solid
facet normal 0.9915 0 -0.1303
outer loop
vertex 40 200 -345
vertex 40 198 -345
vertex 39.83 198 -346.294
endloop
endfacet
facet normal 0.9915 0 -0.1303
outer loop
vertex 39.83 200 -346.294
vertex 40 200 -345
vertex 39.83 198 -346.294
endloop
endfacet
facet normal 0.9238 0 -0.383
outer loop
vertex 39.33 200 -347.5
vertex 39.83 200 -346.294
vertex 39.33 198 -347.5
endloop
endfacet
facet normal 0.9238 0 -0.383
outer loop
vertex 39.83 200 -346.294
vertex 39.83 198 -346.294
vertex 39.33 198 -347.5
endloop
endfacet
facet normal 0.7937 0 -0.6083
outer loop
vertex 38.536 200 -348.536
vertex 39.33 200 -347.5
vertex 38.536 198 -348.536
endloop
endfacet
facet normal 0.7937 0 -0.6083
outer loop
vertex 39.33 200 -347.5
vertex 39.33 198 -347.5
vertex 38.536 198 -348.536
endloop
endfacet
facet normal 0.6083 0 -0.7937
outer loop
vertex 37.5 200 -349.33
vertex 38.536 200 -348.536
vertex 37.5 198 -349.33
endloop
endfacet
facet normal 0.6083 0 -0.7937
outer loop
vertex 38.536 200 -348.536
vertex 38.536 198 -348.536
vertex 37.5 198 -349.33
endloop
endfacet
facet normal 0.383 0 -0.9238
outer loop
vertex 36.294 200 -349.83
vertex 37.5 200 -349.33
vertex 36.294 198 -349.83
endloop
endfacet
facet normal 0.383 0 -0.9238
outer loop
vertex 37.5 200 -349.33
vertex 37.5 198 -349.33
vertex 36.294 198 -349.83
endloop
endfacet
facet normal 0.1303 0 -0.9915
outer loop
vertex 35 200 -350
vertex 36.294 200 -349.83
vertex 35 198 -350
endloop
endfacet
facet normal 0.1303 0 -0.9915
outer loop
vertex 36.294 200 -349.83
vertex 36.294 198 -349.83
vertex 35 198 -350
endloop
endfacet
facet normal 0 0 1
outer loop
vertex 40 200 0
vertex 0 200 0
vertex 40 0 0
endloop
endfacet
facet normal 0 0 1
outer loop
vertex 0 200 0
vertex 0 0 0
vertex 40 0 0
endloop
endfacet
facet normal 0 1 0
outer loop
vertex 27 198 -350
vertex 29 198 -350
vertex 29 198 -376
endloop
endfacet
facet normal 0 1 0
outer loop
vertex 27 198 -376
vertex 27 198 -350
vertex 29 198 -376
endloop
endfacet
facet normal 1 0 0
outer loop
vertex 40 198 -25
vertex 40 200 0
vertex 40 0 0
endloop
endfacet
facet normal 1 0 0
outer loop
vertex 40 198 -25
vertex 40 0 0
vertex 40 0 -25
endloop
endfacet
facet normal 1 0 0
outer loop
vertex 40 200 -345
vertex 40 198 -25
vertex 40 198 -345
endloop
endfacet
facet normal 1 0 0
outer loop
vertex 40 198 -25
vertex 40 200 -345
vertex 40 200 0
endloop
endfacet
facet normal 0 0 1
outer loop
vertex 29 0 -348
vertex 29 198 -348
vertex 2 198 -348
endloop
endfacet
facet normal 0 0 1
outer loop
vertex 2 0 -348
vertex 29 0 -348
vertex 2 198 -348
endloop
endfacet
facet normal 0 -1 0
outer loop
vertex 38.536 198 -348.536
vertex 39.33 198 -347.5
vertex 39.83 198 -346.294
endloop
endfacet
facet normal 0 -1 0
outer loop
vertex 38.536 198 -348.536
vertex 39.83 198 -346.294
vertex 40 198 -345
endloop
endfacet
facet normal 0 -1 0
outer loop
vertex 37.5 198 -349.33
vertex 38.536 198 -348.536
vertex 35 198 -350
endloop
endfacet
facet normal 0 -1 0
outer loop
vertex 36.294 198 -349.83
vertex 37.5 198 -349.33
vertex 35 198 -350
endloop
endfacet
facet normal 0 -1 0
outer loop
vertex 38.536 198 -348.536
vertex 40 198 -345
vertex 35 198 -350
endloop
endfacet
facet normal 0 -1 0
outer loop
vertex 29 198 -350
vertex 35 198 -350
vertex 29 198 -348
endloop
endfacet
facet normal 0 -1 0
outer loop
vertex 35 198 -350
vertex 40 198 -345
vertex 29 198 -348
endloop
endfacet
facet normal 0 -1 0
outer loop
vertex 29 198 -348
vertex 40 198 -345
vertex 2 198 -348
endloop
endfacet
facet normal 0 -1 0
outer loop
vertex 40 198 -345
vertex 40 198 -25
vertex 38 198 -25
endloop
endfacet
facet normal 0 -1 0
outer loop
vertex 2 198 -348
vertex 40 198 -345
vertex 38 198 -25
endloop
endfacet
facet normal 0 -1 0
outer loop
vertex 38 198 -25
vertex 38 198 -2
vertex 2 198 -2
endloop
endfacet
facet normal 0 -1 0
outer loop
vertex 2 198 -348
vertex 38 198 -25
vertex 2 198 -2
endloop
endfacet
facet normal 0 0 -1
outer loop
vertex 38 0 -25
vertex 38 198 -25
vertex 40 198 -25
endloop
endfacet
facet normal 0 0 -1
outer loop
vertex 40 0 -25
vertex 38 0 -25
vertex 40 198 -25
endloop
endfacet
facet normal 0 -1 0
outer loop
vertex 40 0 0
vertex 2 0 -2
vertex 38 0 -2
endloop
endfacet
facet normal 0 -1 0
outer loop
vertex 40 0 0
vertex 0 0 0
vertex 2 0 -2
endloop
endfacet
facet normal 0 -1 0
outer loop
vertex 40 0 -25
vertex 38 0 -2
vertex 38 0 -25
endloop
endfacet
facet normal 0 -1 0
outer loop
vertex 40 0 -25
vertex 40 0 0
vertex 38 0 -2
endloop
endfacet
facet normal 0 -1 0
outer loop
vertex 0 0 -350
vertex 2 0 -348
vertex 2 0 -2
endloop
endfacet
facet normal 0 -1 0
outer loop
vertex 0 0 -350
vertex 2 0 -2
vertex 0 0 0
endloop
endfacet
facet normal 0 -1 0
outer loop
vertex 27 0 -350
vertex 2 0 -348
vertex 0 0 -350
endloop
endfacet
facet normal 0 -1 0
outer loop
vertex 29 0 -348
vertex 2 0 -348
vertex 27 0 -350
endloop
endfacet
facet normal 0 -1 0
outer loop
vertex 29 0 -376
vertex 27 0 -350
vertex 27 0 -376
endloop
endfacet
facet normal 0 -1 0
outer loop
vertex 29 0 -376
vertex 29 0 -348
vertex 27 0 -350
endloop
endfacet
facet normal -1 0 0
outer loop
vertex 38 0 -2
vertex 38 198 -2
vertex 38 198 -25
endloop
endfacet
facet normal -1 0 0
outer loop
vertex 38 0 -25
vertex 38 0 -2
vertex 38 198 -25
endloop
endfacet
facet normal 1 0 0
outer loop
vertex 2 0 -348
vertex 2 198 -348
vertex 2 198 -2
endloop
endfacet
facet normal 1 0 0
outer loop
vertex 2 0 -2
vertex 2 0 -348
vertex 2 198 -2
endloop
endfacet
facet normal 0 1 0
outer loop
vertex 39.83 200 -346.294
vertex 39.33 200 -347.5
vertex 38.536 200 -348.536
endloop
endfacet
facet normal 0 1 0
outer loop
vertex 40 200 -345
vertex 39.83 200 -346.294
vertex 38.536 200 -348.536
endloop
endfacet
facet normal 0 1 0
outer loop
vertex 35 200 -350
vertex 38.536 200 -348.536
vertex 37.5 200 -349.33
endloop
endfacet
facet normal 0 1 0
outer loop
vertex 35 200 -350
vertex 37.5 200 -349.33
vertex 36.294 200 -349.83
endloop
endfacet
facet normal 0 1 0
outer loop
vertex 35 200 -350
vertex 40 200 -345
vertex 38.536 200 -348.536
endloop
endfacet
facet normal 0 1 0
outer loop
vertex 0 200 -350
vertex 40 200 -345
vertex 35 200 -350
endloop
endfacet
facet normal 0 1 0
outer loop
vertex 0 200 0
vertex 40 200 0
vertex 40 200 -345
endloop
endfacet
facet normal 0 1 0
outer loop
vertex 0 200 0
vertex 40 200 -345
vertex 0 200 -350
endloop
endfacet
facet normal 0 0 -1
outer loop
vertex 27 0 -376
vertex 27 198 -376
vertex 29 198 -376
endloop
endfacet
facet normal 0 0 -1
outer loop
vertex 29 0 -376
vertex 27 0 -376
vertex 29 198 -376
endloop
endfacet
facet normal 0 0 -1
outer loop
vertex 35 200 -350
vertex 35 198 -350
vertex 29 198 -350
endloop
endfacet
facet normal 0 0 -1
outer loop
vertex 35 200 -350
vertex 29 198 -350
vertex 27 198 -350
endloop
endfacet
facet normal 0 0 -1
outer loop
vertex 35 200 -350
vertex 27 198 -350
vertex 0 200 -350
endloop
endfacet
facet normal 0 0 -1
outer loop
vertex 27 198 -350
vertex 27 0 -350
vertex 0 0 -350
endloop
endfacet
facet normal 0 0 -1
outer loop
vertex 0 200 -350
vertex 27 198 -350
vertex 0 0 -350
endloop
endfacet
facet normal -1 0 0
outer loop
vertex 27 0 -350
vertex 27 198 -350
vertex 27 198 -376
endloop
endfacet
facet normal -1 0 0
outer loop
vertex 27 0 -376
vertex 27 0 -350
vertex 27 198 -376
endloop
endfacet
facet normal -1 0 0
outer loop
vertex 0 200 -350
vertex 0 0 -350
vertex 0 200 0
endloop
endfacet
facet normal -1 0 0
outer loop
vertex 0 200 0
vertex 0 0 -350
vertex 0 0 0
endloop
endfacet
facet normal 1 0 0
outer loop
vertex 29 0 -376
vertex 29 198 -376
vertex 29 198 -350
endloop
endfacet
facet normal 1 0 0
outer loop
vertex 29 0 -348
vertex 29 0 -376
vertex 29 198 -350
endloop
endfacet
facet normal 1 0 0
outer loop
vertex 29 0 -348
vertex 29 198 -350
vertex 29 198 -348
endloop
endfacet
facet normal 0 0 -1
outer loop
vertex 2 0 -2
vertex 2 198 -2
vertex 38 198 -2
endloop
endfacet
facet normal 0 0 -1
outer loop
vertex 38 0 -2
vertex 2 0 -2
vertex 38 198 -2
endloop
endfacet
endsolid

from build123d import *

# Parameters (mm, degrees)
F4_DEPTH = 2


with BuildPart() as f2:
    # F2: sweep along a path in F1
    with BuildLine(Plane.XY) as f2_path:
        Line((0, 0), (0, 198))
    # F0 (on Front) → F2 (sweep)
    with BuildSketch(Plane.XZ):
        Polygon((40, 0), (0, 0), (0, -350), (27, -350), (27, -376), (29, -376), (29, -348), (2, -348), (2, -2), (38, -2), (38, -25), (40, -25), align=None)
    sweep(path=f2_path.line)

    # F3 (on face) → F4 (join)
    with BuildSketch(Plane(origin=(0, 198, 0), x_dir=(-1, 0, 0), z_dir=(0, 1, 0))):
        with BuildLine():
            Line((-27, -350), (0, -350))
            Line((0, -350), (0, 0))
            Line((0, 0), (-40, 0))
            Line((-40, 0), (-40, -25))
            Line((-40, -25), (-40, -345))
            ThreePointArc((-40, -345), (-38.5355339059, -348.5355339059), (-35, -350))
            Line((-35, -350), (-29, -350))
            Line((-29, -350), (-27, -350))
        make_face()
    extrude(amount=F4_DEPTH)


solid = f2.part
